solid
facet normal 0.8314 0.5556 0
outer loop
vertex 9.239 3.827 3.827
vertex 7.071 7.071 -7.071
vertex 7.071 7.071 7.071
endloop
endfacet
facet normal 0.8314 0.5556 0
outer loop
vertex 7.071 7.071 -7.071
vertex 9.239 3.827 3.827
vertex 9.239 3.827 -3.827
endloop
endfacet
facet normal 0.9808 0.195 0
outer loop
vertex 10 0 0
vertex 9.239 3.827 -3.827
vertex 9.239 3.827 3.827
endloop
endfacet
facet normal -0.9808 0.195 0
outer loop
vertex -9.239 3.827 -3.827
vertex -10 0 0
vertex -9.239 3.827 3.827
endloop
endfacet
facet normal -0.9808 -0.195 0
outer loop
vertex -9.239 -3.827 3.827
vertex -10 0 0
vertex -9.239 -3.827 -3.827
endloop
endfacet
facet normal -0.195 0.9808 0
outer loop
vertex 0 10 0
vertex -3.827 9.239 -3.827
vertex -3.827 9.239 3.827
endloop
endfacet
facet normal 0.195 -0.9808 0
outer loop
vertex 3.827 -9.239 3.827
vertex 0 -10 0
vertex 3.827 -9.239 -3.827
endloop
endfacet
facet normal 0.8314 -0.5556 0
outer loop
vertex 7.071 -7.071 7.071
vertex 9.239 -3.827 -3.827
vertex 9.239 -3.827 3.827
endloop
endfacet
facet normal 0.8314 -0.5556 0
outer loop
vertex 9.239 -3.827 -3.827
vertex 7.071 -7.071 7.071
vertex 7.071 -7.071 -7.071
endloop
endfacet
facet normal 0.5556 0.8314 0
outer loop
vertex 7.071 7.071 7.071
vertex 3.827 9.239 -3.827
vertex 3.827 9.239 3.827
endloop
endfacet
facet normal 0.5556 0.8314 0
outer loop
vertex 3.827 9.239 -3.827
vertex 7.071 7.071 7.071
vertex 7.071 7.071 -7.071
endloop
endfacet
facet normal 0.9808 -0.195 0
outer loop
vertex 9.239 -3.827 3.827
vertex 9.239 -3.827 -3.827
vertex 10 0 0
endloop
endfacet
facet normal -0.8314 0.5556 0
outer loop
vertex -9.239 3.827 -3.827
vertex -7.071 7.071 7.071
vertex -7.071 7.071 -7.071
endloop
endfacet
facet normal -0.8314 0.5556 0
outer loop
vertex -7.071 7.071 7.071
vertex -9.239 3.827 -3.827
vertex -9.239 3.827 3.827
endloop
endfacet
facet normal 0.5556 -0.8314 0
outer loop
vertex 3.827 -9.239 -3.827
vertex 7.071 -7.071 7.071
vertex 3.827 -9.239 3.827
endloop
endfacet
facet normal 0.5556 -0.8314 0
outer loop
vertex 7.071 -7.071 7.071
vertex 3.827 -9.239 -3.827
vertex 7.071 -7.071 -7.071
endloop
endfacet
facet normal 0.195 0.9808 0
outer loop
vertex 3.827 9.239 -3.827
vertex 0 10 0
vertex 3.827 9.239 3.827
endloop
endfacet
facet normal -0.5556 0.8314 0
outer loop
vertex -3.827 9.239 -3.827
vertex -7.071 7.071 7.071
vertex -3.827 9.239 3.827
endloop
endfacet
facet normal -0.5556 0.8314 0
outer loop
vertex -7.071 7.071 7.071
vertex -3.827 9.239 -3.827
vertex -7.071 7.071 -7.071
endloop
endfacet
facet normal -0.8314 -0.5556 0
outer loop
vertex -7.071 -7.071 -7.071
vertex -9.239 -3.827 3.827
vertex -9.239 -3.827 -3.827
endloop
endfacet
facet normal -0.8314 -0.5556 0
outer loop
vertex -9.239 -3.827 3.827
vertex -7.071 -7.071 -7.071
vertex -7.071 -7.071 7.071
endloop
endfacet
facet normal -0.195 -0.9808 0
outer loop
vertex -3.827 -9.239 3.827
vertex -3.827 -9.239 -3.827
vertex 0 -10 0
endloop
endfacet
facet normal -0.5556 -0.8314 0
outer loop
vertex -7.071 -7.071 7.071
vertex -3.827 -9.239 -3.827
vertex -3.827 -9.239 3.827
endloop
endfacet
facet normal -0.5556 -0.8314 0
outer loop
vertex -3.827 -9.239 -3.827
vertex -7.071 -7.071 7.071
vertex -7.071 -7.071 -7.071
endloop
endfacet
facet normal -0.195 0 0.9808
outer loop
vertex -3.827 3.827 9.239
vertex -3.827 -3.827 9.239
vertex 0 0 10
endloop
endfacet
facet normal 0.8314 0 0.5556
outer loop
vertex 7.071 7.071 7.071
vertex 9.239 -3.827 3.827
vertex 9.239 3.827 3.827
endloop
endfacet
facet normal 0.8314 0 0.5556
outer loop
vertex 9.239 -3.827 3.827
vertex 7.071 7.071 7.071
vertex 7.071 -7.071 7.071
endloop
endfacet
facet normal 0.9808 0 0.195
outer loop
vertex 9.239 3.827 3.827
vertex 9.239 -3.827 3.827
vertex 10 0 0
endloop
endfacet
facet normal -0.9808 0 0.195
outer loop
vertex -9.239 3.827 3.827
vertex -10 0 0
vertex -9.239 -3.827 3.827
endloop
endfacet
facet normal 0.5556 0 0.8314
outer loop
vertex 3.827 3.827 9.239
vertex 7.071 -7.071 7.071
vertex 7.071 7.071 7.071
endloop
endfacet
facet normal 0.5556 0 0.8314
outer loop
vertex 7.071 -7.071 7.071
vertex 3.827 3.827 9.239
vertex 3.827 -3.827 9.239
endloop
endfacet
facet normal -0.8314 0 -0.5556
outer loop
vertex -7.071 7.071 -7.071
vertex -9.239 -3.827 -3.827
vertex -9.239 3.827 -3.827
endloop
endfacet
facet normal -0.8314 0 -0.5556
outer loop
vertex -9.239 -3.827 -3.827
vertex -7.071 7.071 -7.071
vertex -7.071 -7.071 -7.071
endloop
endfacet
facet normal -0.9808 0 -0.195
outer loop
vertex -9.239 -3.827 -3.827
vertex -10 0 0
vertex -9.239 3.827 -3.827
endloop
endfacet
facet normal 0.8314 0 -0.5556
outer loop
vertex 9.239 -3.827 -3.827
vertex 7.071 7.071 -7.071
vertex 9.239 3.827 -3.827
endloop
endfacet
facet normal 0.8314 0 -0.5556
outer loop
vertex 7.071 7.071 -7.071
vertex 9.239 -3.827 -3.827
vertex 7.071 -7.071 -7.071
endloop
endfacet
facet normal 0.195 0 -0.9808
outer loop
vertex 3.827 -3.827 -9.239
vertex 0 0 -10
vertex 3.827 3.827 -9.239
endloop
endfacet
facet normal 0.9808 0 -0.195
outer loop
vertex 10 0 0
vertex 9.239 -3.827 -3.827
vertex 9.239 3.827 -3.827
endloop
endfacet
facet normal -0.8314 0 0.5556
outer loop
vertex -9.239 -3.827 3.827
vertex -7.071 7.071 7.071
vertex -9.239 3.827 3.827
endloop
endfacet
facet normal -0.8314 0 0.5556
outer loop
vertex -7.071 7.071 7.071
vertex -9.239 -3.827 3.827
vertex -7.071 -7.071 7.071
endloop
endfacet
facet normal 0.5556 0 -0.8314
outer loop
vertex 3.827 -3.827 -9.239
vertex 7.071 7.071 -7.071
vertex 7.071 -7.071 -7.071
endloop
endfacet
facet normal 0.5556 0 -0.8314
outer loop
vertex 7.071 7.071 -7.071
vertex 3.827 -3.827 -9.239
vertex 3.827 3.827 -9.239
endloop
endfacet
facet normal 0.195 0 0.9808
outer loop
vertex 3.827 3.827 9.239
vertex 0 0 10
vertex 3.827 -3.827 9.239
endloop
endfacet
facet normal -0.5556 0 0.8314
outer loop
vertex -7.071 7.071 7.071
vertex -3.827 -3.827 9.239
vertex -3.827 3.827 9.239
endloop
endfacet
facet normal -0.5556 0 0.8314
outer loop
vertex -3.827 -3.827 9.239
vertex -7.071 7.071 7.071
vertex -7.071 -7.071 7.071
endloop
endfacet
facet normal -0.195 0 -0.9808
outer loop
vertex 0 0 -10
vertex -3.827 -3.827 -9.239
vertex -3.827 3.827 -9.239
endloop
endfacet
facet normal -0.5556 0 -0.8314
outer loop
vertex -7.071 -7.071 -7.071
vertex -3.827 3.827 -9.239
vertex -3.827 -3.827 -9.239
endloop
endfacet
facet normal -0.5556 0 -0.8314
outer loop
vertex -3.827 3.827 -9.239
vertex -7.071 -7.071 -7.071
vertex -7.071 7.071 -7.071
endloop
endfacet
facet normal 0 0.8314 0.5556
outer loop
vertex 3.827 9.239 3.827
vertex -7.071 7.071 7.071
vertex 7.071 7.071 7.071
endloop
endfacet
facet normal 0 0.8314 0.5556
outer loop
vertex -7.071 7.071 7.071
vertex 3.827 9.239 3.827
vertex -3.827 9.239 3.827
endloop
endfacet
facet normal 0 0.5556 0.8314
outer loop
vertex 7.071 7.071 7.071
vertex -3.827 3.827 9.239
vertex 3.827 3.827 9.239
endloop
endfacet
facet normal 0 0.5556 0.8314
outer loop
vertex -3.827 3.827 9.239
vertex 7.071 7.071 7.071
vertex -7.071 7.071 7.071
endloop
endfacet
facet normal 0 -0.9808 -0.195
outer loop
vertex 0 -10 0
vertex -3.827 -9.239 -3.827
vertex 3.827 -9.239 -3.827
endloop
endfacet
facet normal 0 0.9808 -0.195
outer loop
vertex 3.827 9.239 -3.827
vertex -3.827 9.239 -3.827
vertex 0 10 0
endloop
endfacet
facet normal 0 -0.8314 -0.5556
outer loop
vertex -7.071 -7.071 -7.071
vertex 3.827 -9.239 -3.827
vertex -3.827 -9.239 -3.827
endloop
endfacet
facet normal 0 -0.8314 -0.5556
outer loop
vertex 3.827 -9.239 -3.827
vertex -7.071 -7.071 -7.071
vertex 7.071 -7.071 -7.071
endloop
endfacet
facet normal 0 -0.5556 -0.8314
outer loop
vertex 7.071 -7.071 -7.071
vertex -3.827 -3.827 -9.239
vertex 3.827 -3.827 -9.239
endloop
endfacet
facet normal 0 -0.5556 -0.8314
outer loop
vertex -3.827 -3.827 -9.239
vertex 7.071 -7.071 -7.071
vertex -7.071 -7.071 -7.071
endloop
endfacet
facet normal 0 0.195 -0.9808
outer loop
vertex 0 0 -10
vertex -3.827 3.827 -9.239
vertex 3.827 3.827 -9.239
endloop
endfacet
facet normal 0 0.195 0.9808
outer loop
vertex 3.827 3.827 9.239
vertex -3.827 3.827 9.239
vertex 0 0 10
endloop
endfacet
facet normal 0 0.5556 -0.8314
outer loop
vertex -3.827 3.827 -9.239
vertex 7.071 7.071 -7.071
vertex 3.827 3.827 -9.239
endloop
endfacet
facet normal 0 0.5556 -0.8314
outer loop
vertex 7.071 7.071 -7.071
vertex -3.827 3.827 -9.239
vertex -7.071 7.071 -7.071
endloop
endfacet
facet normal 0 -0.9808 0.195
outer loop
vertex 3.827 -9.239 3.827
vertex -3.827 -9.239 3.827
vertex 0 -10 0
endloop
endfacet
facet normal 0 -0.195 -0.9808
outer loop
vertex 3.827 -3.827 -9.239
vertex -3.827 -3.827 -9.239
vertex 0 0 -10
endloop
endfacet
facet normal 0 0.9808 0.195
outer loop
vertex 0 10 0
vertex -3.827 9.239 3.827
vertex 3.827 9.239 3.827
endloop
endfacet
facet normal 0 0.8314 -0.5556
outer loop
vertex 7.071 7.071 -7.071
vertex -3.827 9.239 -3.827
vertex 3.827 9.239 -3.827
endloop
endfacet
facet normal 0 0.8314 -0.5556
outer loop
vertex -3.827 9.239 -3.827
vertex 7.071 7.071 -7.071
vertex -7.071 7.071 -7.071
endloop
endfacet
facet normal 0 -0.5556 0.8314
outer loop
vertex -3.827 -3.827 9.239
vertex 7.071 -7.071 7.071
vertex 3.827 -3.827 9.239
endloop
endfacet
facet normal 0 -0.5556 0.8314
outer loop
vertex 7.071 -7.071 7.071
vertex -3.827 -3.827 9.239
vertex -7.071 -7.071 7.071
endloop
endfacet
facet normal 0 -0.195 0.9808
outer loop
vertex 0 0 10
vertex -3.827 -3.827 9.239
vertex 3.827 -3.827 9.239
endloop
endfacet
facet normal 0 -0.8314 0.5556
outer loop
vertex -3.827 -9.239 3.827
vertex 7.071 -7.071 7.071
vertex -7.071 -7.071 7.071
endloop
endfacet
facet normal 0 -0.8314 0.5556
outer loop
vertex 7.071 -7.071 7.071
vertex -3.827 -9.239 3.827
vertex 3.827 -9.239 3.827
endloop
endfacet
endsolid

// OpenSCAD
// D3 — three coarse cylinders intersected. Each seam runs to tangency at its
// ends, so a per-edge crease gate erodes it; merging patch pairs on their
// maximum dihedral keeps every seam whole.
intersection() {
  cylinder(h = 40, r = 10, center = true, $fn = 16);
  rotate([90, 0, 0]) cylinder(h = 40, r = 10, center = true, $fn = 16);
  rotate([0, 90, 0]) cylinder(h = 40, r = 10, center = true, $fn = 16);
}
